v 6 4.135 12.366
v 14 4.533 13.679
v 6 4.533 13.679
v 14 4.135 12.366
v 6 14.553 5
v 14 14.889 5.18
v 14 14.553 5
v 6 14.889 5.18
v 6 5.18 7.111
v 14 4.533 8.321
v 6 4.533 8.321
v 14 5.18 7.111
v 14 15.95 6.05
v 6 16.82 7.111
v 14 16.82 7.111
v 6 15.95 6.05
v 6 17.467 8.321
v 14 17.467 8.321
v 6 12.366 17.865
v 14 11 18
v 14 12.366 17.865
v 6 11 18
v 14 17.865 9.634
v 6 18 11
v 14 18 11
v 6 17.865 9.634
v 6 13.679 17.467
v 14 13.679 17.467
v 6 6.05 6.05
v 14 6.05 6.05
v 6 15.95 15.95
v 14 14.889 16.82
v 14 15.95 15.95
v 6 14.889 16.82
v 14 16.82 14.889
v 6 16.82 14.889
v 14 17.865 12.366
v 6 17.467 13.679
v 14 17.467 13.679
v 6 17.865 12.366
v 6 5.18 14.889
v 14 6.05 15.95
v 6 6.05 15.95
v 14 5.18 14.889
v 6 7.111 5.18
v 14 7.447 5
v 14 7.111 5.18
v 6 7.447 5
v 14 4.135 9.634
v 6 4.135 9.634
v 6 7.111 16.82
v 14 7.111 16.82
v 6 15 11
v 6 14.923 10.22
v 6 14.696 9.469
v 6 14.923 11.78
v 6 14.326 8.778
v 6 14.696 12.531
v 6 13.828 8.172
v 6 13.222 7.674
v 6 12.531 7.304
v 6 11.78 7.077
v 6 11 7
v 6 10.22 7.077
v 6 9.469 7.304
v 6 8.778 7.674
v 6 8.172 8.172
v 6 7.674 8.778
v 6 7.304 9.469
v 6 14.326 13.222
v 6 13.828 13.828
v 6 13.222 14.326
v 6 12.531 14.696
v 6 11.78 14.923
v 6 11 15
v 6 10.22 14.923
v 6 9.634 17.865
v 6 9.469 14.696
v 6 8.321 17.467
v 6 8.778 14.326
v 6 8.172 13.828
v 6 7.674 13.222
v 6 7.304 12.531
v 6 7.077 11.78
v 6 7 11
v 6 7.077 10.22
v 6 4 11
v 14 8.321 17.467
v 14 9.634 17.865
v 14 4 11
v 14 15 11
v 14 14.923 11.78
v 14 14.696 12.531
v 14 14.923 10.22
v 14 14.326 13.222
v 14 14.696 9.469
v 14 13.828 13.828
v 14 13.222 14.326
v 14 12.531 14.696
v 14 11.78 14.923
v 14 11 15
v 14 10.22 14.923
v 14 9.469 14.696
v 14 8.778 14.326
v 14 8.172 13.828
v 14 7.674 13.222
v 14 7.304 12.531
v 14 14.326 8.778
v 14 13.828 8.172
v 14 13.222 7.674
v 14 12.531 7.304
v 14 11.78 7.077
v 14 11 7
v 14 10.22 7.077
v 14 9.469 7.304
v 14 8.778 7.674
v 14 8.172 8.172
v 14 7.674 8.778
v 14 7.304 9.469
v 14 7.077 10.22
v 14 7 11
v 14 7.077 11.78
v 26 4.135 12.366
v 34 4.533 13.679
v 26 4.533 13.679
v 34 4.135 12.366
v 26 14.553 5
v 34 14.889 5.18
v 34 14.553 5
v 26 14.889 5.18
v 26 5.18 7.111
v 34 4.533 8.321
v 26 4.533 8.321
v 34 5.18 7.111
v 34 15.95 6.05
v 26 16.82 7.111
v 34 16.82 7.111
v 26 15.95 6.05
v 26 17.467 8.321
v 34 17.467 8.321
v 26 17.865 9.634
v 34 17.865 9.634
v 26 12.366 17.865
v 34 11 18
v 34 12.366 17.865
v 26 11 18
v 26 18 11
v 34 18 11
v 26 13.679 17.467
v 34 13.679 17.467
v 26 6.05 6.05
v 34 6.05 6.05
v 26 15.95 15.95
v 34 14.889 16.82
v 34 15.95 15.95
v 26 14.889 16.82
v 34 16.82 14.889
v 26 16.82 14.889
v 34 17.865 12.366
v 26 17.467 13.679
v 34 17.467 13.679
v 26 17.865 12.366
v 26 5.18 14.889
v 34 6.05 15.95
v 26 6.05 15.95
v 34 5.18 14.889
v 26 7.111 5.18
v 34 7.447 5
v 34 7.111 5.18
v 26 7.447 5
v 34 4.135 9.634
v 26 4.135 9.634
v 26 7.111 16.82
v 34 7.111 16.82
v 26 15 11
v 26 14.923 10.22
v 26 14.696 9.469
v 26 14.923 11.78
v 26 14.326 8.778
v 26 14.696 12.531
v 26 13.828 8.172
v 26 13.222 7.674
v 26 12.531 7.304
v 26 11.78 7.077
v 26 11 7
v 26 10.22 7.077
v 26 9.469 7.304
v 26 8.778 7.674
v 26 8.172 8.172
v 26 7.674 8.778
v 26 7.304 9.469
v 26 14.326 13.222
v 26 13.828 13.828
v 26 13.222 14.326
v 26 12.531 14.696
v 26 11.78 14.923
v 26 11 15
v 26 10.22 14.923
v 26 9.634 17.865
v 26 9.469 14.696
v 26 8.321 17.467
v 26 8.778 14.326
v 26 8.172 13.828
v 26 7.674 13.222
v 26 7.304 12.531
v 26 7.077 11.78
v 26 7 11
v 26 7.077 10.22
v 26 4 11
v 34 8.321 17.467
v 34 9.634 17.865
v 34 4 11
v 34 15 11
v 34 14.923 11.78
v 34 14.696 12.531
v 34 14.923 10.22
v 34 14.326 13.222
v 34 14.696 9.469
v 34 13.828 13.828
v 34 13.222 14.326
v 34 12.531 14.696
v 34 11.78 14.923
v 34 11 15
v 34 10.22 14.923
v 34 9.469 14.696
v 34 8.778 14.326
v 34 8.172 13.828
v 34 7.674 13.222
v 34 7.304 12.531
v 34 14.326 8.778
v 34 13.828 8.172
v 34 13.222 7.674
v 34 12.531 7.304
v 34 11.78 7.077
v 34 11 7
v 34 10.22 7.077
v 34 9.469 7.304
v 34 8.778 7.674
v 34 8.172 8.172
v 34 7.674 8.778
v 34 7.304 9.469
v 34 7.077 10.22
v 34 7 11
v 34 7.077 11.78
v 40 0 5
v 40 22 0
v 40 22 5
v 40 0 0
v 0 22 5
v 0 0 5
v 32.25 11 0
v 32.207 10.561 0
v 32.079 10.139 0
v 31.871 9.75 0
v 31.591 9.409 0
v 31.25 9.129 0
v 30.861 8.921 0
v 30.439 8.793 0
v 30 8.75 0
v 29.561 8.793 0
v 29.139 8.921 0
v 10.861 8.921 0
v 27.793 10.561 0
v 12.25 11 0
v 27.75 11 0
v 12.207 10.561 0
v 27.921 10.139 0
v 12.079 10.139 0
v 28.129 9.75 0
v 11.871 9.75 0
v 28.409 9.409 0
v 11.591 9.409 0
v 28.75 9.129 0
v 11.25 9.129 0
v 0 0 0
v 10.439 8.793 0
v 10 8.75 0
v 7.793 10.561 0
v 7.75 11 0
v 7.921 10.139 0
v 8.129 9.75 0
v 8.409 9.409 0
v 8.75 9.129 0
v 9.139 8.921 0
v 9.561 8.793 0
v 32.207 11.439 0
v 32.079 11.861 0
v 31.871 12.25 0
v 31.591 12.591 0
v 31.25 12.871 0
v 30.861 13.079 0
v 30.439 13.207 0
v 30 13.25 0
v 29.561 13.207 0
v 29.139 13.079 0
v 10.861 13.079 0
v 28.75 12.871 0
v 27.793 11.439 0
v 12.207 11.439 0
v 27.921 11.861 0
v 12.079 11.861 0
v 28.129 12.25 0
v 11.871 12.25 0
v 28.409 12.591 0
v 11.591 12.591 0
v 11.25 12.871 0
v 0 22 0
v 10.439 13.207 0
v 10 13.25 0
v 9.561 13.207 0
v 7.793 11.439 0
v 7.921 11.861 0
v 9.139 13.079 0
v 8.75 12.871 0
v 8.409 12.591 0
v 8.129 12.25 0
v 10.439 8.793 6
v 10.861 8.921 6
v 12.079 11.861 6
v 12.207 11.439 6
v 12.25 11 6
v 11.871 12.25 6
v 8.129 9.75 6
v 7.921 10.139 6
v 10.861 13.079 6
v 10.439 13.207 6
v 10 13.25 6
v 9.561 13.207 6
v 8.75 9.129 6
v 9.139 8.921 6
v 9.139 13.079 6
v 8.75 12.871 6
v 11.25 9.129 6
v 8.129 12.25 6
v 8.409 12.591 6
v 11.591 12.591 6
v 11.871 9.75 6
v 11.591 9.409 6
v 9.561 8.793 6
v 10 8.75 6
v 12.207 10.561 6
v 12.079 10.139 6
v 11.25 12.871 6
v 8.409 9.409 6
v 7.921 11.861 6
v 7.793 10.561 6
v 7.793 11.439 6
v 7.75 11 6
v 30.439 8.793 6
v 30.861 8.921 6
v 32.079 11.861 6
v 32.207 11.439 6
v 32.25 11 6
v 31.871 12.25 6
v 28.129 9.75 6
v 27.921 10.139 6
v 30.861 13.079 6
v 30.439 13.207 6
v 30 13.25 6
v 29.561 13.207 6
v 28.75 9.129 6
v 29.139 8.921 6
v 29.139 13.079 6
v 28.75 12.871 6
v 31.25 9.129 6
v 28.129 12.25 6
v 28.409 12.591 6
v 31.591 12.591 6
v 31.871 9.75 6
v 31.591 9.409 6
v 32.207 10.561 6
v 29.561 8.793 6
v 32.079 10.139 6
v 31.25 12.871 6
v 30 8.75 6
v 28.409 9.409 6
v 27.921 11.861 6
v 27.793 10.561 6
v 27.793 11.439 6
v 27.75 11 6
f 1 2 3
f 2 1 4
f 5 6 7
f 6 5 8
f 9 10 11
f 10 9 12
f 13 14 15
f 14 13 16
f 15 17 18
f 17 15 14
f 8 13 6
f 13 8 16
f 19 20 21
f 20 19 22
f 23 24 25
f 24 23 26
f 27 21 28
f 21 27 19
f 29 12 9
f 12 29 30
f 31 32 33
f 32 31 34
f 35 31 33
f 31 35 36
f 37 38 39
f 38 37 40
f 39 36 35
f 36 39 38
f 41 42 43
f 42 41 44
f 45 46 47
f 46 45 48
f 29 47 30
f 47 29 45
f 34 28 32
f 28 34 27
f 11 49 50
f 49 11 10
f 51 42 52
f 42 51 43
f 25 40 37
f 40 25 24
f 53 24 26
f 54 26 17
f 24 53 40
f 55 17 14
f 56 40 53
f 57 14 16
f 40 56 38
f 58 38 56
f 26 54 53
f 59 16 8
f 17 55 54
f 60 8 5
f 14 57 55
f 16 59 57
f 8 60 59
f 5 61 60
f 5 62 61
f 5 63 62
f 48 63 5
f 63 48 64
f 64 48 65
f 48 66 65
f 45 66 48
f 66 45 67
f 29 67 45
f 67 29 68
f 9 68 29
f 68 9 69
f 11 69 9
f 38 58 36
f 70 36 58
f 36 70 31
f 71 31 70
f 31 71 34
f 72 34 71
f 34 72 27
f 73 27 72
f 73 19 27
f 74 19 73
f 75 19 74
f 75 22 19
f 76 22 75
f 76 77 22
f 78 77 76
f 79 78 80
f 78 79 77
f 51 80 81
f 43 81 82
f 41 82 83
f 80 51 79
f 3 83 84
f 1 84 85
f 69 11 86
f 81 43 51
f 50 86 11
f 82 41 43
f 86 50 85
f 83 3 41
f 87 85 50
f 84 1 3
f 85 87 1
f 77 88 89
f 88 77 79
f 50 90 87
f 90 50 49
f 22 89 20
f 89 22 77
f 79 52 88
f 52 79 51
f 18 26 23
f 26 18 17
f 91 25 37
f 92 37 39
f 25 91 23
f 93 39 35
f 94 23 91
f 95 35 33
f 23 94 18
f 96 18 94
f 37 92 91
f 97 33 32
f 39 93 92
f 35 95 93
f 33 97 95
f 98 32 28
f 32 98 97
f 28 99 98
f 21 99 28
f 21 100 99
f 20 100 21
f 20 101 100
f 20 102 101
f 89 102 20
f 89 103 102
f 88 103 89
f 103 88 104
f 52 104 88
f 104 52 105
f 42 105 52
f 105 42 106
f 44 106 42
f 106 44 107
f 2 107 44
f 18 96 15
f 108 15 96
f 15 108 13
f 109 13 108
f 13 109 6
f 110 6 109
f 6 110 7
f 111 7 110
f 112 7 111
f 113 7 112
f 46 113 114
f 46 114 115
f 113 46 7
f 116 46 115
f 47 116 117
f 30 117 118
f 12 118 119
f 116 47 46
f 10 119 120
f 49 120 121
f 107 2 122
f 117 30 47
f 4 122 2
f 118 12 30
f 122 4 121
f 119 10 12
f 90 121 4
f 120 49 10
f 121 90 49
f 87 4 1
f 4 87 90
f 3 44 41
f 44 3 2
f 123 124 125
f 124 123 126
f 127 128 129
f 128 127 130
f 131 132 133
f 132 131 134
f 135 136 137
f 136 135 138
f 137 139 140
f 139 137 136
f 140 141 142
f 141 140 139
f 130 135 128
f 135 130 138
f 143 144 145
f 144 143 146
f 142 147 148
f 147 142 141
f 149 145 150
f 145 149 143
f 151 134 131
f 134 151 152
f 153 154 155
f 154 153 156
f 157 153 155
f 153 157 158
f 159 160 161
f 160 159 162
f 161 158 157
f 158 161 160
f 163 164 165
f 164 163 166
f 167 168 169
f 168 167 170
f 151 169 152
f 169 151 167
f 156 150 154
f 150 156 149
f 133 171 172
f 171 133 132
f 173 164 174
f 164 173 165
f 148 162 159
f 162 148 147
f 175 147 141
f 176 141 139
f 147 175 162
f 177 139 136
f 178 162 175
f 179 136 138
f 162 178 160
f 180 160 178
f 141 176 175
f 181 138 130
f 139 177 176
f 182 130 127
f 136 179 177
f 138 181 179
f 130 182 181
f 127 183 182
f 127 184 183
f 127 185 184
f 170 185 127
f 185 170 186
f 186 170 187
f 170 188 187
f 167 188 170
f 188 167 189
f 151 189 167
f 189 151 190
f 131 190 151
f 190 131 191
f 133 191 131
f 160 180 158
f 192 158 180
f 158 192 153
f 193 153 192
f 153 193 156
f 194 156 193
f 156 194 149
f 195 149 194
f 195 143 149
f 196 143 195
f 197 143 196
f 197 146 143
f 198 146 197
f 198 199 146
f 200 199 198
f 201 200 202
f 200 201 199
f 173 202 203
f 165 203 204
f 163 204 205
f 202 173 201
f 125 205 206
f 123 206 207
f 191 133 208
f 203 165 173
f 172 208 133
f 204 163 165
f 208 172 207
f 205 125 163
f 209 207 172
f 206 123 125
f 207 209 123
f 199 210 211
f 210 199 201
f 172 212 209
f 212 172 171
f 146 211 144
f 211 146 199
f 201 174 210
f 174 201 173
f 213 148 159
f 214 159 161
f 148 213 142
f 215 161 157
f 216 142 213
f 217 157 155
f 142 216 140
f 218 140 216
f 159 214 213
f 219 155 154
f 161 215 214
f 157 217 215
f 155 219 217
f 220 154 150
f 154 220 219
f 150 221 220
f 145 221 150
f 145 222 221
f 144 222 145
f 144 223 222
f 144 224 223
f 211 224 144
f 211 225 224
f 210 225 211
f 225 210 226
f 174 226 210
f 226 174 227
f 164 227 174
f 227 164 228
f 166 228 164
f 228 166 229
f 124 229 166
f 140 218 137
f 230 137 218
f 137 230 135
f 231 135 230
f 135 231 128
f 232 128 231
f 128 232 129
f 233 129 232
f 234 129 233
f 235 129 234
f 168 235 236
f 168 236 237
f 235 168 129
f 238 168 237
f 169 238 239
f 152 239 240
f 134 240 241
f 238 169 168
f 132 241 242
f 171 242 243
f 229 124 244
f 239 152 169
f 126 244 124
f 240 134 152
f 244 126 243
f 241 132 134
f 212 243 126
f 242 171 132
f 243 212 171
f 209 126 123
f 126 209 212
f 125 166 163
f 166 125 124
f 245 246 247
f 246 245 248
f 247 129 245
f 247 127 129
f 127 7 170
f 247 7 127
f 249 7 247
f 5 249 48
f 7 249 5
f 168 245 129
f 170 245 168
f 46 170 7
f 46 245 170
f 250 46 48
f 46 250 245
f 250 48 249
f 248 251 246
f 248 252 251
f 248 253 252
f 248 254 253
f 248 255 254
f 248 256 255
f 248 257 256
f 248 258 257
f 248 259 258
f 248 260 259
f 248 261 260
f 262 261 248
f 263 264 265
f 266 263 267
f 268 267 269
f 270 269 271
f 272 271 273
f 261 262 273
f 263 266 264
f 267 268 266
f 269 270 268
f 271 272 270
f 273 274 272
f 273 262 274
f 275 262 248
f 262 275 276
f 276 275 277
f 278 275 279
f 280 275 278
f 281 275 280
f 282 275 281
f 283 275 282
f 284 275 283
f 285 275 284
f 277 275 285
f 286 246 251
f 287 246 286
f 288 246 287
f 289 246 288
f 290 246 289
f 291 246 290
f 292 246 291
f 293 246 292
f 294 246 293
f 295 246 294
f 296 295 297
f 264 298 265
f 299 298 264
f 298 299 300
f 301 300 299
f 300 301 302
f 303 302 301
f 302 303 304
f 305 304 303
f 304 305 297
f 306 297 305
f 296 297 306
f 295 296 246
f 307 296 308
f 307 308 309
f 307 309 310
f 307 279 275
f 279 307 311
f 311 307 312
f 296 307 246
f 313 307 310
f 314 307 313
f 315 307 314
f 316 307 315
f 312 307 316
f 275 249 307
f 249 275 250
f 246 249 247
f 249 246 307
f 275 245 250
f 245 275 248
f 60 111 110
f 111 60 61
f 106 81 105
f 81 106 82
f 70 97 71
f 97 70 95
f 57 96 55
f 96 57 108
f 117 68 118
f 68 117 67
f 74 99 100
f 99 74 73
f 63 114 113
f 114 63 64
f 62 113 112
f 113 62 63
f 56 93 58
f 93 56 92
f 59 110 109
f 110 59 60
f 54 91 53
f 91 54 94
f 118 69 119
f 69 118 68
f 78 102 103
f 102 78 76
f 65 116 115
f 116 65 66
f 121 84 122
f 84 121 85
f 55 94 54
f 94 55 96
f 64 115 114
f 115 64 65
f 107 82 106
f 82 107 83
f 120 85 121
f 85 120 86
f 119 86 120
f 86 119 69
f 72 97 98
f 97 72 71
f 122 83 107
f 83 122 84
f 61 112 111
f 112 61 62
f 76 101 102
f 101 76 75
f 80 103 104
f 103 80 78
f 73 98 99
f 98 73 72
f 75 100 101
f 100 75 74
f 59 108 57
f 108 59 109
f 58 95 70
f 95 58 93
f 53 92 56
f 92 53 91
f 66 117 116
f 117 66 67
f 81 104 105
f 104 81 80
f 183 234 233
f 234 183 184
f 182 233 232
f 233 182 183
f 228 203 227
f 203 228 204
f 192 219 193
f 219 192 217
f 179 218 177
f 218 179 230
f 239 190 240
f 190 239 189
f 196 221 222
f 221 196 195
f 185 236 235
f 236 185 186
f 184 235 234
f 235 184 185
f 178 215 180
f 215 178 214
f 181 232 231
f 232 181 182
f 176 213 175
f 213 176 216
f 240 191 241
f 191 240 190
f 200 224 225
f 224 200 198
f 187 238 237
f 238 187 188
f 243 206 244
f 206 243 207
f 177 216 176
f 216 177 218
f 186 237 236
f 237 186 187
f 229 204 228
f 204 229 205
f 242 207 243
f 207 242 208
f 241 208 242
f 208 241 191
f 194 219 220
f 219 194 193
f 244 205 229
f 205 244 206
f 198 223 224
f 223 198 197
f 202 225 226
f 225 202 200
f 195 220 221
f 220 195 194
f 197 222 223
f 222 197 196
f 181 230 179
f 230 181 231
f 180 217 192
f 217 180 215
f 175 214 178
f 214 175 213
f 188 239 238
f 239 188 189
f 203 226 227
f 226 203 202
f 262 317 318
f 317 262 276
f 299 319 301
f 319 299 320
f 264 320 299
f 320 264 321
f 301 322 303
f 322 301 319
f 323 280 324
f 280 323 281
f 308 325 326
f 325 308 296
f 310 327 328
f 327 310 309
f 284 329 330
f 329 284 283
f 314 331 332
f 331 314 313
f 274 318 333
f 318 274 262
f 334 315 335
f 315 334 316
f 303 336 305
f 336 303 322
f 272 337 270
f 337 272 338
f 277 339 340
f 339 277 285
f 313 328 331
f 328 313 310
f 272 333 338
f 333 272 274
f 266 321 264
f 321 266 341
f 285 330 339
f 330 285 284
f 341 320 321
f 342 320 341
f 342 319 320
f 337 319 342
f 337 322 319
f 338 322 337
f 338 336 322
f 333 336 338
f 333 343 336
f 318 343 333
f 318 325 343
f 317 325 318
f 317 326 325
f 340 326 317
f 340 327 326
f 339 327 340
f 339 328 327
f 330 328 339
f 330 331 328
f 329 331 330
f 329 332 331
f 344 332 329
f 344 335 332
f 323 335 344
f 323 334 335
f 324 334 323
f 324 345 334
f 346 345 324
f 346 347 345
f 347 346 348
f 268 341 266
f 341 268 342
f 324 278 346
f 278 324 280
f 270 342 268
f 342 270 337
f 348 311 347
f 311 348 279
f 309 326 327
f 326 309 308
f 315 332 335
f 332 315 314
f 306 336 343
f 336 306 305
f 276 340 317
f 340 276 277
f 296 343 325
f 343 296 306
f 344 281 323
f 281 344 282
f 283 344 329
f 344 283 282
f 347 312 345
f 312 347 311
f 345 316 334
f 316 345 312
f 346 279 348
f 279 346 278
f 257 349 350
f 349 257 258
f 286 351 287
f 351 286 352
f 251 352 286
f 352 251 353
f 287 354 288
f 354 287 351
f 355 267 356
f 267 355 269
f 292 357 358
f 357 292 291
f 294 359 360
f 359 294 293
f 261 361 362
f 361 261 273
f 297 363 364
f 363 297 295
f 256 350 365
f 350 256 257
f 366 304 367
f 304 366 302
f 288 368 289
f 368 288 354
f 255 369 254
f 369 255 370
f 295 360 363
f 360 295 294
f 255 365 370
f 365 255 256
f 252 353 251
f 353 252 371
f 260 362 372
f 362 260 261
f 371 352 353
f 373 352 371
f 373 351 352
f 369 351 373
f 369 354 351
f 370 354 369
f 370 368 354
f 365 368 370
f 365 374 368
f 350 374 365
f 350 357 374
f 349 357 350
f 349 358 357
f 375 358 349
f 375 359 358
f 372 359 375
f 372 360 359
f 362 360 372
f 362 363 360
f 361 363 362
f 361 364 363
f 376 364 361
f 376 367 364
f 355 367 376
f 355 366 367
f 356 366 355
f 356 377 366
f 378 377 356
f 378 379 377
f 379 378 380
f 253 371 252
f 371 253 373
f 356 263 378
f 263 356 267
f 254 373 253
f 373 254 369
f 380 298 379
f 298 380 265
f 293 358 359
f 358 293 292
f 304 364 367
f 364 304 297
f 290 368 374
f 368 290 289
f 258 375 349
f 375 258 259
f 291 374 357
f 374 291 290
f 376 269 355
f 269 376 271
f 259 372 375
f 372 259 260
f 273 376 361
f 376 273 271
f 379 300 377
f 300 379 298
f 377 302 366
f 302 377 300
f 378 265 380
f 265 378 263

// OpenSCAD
$fn = 32;

// ----------------------------------------------------------------------
// Cable clip: cable 8 mm, clamp 14 mm, base 40 mm
// ----------------------------------------------------------------------

// --- parameters (mm) ---
base_w = 40;              // base length, X
base_d = 22;              // base width, Y
base_t = 5;               // base thickness
clamp_d = 14;             // clamp outside diameter
wall_t = 3;               // clamp wall
cable_d = 8;              // cable opening
ring_w = 8;               // clamp width along the cable
screw_d = 4.5;            // screw clearance
sink = 1;                 // overlap of the clamp into the base
pitch = 20;               // distance between the two clamps

module base() {
  cube([base_w, base_d, base_t]);
}

module clamps() {
  for (sx = [-1, 1])
    translate([base_w / 2 + sx * pitch / 2, base_d / 2, base_t + clamp_d / 2 - sink]) rotate([0, 90, 0])
      cylinder(h = ring_w, d = clamp_d, center = true);
}

difference() {
  union() {
    base();
    clamps();
  }
  for (sx = [-1, 1])
    translate([base_w / 2 + sx * pitch / 2, base_d / 2, base_t + clamp_d / 2 - sink]) rotate([0, 90, 0]) translate([0, 0, -ring_w / 2 - 1]) cylinder(h = ring_w + 2, d = cable_d);
  translate([10, base_d / 2, -1]) cylinder(h = base_t + 2, d = screw_d);
  translate([30, base_d / 2, -1]) cylinder(h = base_t + 2, d = screw_d);
}
